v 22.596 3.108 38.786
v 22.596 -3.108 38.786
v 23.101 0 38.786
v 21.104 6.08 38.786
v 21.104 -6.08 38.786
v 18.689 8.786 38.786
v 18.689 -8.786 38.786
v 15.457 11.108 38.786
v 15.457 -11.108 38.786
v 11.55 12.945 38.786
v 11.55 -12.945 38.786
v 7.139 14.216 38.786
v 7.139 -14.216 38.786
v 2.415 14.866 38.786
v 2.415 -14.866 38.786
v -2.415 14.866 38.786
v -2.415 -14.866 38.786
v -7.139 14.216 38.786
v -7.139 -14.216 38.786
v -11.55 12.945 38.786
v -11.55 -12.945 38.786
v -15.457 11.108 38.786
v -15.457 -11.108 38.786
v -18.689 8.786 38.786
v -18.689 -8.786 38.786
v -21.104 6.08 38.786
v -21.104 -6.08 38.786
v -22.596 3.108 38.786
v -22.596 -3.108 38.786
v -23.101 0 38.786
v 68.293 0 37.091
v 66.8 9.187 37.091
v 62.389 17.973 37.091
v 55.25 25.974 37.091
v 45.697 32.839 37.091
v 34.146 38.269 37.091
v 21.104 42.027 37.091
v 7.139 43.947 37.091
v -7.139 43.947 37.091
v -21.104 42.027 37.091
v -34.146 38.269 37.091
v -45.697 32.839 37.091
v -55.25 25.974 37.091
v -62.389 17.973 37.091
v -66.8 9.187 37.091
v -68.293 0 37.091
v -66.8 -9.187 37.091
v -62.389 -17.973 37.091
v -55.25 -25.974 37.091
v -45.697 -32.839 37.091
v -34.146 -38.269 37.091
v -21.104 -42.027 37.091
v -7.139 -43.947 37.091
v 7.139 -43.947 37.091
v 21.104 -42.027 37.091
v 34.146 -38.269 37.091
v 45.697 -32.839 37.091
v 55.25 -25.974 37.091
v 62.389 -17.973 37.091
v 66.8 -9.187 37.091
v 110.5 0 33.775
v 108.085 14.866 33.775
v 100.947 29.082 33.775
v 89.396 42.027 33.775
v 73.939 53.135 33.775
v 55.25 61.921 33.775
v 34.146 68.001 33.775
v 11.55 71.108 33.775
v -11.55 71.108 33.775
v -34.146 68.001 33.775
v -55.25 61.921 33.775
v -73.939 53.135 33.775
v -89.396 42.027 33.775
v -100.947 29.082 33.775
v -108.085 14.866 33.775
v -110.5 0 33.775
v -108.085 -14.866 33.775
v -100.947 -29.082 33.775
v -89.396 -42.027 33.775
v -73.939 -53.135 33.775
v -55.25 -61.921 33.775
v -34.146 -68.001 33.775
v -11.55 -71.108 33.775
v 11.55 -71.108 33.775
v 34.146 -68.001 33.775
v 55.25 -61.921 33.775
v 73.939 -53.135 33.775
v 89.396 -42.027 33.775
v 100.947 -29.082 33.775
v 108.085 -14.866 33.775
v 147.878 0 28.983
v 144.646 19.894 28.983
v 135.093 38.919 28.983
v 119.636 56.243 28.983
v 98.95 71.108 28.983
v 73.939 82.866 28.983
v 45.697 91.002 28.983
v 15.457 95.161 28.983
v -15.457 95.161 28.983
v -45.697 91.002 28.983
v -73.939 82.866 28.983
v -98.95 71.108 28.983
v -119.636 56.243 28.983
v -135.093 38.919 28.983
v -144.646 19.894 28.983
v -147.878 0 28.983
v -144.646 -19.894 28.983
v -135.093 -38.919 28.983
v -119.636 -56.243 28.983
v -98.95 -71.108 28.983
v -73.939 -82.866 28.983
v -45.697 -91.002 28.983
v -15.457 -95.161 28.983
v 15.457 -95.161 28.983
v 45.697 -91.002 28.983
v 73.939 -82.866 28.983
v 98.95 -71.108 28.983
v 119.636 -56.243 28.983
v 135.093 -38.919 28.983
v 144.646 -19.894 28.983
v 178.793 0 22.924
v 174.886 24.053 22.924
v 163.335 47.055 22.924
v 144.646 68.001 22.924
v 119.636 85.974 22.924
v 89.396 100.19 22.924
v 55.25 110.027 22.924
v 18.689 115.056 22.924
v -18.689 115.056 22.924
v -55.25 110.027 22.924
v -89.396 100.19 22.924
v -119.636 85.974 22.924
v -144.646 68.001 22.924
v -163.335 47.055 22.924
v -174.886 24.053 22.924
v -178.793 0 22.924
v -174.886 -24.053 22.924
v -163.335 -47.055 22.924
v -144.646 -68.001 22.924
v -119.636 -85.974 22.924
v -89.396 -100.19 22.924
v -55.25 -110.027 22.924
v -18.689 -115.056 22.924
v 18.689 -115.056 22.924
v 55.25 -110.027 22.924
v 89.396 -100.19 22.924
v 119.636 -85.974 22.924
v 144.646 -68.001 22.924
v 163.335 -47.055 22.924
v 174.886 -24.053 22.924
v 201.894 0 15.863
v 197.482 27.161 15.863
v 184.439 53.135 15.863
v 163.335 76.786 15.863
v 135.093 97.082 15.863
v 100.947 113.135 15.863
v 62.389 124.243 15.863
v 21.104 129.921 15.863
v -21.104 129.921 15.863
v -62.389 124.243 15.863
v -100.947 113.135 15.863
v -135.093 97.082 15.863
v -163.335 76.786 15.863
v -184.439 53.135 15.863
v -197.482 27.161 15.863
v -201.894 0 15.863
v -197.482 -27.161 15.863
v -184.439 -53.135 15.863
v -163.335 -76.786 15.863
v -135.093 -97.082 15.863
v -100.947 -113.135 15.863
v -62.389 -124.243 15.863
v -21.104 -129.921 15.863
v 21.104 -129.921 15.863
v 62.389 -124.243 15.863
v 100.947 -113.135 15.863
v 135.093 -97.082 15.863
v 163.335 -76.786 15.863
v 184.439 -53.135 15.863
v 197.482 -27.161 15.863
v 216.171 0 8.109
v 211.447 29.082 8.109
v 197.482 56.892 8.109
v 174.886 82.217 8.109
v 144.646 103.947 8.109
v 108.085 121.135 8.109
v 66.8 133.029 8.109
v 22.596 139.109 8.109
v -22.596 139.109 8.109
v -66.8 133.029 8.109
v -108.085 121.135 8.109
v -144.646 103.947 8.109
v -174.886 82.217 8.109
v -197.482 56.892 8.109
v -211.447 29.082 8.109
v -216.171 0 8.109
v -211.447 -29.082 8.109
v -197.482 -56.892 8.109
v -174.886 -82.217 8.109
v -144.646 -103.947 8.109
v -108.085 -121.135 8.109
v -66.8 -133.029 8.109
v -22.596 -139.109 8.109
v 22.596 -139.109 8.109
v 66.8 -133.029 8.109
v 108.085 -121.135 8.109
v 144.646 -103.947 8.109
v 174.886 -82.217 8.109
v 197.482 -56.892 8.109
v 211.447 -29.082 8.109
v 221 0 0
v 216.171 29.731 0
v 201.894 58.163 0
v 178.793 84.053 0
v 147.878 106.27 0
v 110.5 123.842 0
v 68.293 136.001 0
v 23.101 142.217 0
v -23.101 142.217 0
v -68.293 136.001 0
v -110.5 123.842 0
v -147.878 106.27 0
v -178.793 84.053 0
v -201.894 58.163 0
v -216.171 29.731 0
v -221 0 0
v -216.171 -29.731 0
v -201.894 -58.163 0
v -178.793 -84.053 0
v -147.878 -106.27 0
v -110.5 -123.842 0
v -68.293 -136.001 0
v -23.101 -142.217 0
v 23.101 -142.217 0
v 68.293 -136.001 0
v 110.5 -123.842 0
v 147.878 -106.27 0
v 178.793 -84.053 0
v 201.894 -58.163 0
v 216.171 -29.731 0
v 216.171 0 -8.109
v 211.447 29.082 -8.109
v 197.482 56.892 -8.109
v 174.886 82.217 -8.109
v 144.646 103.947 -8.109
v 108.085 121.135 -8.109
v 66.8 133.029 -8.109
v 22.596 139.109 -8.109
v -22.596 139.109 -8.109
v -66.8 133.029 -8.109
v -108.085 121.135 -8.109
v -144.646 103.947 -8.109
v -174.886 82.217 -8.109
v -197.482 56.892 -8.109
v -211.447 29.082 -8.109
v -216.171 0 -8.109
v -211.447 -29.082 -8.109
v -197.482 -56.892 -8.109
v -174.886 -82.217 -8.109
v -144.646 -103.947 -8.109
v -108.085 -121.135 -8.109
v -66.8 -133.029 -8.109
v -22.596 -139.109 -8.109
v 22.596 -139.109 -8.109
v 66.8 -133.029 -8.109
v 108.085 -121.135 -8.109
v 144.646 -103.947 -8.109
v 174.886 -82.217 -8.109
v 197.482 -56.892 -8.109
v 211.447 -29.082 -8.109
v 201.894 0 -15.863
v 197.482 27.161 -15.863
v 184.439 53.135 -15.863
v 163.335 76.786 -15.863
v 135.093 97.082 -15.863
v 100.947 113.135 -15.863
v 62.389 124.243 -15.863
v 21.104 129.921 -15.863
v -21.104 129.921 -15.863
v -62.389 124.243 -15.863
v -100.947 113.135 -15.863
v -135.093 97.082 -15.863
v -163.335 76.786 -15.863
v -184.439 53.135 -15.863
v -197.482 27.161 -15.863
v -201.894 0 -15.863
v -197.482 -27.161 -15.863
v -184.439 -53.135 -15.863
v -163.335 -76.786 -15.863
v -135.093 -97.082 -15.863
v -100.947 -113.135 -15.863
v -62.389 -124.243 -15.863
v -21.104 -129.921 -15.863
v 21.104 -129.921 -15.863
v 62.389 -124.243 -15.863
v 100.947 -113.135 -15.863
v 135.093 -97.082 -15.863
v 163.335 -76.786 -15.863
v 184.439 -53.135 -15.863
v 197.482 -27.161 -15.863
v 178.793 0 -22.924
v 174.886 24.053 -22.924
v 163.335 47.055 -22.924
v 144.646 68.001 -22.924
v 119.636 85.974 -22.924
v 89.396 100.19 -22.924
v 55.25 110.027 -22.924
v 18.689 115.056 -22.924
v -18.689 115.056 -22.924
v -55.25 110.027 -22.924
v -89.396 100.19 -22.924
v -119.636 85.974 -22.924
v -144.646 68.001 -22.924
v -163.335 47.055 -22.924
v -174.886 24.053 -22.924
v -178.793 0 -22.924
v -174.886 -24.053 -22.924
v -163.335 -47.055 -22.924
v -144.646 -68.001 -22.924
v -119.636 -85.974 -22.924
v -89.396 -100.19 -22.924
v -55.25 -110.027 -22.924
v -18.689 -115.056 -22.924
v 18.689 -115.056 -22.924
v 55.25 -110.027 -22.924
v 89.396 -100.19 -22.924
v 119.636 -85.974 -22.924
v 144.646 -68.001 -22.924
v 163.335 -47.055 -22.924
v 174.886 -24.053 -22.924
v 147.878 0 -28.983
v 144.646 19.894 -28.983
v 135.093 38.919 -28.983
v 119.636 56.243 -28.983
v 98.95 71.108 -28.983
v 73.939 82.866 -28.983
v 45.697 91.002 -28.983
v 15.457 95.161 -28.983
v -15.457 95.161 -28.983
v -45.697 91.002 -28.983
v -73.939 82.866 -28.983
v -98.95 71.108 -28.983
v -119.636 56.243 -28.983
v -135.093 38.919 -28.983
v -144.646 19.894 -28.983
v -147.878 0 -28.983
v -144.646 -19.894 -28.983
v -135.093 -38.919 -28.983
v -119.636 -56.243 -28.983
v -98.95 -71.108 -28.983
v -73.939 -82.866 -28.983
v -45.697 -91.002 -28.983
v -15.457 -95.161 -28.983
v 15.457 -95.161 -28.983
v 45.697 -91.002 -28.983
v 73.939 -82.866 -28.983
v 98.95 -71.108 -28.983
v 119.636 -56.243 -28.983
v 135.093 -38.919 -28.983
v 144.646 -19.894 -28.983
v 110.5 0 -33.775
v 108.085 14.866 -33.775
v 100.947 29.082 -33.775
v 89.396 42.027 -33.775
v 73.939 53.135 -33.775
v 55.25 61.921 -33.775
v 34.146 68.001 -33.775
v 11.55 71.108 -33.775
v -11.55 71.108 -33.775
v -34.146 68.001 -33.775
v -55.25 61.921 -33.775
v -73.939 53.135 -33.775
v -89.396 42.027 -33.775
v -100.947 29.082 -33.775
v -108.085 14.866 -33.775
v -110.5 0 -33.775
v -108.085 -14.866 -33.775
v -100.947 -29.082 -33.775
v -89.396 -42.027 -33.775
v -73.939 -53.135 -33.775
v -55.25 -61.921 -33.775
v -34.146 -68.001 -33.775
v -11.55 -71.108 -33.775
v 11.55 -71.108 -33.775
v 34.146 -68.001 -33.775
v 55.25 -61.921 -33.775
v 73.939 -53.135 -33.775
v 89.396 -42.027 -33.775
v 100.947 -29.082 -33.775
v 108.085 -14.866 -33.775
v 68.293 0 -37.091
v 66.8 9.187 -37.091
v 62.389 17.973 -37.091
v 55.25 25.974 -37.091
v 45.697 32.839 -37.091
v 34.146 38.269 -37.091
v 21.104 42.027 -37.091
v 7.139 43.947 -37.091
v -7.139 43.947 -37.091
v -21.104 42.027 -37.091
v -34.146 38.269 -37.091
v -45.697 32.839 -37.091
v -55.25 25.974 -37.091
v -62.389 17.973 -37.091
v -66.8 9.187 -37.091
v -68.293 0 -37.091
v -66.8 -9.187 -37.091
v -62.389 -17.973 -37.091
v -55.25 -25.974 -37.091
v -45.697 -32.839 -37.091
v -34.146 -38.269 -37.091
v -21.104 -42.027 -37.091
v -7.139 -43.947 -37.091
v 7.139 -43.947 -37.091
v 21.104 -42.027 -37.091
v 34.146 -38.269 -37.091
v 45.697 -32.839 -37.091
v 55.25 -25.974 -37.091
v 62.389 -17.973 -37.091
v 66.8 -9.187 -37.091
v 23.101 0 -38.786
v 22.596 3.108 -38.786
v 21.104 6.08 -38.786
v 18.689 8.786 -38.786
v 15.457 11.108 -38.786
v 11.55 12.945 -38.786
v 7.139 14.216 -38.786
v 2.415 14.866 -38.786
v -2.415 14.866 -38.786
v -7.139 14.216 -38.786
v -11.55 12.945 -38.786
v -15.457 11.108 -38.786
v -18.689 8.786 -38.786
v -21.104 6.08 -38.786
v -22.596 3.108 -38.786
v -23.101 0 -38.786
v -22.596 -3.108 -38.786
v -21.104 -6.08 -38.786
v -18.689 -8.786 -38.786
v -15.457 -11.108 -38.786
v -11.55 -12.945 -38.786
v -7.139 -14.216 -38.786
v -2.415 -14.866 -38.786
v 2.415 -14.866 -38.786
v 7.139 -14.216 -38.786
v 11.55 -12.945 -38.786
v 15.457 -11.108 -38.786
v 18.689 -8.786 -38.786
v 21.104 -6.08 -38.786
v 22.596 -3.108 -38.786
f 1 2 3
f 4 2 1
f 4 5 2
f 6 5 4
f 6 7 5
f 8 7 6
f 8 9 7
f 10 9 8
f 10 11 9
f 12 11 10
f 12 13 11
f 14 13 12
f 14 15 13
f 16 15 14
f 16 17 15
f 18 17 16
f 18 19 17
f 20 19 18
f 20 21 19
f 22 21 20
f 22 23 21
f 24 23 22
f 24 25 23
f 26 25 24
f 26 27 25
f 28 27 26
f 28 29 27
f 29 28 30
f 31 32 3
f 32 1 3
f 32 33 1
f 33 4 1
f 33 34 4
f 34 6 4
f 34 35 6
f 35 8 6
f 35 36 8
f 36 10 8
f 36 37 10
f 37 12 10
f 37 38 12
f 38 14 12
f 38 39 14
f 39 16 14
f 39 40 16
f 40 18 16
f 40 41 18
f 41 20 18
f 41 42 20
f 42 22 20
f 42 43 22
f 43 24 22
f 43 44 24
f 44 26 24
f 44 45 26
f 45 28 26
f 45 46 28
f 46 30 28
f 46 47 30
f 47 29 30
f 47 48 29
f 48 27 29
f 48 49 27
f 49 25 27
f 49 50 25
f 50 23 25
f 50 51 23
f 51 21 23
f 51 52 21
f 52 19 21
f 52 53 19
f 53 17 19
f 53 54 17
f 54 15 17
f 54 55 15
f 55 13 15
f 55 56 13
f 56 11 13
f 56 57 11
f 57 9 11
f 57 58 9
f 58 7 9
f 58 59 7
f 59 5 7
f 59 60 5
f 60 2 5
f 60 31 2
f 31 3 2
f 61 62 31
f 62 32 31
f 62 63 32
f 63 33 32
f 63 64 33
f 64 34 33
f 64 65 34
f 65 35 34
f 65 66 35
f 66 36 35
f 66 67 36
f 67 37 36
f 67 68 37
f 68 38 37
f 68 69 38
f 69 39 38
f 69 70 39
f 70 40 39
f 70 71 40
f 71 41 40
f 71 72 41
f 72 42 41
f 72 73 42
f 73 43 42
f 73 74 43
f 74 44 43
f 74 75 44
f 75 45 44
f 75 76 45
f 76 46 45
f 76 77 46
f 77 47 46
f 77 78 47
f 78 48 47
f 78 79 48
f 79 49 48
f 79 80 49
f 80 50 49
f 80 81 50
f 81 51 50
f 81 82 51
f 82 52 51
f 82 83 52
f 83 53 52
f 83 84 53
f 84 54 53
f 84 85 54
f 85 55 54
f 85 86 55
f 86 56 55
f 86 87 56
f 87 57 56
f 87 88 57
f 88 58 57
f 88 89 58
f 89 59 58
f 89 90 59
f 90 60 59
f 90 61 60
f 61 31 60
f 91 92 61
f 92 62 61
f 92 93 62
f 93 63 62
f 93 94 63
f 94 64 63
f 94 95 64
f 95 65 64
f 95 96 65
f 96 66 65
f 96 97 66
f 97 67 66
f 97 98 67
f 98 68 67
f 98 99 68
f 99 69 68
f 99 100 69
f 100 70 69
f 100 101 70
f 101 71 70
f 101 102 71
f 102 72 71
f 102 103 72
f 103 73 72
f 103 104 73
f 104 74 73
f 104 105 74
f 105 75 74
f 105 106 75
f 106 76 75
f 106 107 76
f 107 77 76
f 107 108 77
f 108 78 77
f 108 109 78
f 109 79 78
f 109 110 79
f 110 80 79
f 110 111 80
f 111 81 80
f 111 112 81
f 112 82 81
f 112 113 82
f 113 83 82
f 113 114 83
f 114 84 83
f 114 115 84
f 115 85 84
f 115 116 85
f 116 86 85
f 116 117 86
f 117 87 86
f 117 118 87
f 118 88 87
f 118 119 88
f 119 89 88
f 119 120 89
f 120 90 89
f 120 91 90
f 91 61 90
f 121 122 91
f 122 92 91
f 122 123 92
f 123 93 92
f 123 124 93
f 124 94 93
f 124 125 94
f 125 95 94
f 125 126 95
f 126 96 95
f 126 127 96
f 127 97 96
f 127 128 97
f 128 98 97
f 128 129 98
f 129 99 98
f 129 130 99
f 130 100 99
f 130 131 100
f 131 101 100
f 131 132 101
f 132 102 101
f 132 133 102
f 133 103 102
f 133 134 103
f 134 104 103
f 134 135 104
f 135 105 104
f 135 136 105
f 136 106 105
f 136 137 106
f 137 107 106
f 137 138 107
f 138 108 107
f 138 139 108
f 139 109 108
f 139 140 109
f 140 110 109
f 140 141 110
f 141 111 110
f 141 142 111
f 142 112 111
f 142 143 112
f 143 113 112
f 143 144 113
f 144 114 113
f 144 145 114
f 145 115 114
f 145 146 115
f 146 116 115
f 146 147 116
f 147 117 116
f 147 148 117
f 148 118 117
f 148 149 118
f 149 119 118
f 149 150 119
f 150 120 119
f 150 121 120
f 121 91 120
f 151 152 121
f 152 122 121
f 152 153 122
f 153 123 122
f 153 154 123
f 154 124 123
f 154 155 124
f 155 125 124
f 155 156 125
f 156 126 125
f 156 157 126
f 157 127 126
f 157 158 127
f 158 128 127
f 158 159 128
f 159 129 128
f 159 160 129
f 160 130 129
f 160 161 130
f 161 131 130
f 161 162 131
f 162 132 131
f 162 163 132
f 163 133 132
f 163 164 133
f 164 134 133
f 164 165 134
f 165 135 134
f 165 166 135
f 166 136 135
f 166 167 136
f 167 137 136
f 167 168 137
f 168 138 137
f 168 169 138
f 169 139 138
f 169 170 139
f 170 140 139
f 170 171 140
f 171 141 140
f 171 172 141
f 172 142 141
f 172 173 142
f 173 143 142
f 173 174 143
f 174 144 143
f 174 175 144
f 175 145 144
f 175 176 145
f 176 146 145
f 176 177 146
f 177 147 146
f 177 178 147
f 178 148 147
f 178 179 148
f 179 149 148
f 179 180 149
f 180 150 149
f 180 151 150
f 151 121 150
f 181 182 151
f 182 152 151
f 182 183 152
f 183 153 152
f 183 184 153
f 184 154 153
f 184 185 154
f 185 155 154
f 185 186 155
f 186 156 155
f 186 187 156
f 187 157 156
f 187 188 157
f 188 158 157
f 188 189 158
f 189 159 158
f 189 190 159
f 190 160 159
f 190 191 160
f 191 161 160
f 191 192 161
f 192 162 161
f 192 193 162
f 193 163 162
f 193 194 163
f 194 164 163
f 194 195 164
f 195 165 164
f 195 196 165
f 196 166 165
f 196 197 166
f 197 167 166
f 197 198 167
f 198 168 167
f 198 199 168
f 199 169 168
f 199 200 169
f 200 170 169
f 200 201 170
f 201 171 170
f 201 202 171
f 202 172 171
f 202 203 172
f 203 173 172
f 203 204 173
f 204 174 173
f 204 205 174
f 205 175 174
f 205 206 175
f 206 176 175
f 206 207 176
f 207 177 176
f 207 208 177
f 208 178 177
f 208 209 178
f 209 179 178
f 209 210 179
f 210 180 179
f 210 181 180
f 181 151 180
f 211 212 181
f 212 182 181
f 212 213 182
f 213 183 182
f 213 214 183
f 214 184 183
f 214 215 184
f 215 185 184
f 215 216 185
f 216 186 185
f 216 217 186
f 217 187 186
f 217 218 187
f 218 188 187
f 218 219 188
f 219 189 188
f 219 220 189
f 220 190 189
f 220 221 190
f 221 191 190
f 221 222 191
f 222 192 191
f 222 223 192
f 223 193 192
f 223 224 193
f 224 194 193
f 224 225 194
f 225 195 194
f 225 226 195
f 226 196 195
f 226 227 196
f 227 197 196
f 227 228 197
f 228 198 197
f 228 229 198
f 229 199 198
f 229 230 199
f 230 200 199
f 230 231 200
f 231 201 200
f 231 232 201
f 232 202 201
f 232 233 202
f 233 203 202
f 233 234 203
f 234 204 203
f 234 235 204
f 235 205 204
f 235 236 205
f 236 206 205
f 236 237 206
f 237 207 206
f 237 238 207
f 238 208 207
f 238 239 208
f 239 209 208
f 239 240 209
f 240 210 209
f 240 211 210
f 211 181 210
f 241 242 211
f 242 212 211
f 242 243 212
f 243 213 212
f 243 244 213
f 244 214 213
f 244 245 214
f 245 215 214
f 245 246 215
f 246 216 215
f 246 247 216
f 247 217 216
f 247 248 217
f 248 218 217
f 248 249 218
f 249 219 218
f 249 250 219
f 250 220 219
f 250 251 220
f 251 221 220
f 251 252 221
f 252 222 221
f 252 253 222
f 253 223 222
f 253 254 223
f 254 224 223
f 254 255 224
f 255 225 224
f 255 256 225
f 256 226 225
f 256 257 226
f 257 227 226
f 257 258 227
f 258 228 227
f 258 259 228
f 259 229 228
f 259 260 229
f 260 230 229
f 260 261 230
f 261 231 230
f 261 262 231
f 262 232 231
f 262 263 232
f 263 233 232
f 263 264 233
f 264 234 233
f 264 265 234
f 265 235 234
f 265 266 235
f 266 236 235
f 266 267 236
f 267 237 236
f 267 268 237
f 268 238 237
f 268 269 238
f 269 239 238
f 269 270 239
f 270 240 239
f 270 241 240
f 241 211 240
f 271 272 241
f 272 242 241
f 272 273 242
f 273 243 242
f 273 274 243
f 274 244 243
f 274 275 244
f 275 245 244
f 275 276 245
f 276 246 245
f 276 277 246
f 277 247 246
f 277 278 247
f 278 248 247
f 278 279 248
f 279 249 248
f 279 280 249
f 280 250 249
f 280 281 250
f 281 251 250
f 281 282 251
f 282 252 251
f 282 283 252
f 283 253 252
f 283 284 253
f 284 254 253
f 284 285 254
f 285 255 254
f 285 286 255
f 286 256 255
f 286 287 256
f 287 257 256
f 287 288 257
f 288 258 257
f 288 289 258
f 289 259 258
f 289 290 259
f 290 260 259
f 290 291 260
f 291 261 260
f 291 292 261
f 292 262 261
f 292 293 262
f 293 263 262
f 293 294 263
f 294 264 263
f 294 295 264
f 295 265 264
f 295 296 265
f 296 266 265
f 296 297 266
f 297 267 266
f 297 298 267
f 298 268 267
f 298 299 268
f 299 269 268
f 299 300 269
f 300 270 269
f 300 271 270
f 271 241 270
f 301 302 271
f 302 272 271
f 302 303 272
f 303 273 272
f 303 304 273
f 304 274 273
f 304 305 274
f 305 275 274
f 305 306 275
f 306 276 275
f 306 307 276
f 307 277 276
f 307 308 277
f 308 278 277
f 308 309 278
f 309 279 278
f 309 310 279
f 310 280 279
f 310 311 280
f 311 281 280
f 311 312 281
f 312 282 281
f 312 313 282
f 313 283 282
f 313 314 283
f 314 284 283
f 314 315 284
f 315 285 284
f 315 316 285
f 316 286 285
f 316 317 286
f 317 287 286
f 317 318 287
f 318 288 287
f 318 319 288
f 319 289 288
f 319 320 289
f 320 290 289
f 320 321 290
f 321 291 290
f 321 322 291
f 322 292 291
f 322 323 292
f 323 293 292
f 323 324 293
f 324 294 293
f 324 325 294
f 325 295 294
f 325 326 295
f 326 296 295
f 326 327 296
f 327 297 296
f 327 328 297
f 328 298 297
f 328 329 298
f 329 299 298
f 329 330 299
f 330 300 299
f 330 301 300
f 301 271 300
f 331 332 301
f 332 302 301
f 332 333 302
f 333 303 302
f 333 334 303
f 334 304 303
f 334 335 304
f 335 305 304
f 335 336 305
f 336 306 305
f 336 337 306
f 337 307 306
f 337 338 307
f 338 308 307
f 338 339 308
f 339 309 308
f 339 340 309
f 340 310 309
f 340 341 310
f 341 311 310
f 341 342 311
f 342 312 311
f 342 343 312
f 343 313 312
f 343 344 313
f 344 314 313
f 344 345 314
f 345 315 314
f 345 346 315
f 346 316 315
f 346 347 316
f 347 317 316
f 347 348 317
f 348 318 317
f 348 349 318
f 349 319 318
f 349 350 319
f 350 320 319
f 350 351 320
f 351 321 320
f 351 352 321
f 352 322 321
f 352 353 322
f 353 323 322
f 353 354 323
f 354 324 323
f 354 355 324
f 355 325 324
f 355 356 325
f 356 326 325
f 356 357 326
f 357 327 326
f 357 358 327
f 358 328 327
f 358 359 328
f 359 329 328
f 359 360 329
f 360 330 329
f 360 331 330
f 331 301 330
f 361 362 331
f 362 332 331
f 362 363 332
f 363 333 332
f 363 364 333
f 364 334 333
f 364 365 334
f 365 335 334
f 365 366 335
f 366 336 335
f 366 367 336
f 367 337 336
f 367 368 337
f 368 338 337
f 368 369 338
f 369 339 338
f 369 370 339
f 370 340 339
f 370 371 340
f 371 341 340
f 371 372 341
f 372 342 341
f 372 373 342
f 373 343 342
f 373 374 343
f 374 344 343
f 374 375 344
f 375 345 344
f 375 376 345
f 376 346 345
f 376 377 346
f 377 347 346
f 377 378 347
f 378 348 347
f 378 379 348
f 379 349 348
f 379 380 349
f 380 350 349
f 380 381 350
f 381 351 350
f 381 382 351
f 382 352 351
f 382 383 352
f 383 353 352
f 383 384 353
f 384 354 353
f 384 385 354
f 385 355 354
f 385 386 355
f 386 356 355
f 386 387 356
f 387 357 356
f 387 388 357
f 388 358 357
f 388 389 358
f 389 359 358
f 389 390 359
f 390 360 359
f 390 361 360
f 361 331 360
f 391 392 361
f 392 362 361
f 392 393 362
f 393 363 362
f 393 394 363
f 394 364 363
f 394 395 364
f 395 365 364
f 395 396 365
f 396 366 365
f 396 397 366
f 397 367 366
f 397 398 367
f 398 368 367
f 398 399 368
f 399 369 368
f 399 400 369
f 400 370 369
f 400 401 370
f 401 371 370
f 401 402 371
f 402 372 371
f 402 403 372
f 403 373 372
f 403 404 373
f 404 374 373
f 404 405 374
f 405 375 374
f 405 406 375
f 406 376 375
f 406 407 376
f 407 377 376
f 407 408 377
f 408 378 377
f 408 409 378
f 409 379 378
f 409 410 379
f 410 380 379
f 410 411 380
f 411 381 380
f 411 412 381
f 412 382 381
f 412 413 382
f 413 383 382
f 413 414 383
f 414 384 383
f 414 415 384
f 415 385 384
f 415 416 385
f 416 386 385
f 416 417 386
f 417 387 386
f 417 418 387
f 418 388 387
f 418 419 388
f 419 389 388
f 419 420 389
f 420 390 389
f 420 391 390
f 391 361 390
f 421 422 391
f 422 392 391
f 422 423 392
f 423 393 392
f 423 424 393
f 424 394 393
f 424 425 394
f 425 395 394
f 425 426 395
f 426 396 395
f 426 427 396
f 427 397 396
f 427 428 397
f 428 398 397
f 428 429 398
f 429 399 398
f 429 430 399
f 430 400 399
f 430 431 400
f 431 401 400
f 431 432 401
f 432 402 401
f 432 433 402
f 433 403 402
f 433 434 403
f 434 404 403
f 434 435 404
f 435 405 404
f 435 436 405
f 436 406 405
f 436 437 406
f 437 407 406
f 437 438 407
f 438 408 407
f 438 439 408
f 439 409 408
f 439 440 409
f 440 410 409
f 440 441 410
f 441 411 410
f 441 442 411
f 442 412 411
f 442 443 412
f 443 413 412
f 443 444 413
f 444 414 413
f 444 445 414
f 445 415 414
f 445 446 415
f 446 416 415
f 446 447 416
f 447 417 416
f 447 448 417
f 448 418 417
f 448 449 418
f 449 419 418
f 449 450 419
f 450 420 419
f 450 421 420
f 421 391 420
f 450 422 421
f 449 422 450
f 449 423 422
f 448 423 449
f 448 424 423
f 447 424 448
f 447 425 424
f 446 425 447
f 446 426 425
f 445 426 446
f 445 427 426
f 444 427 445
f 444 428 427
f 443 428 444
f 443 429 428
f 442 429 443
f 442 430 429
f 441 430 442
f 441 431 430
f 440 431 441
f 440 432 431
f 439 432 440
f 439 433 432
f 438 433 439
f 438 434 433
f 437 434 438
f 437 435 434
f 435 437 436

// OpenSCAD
// Generated by SolidPython 1.0.1 on 2020-07-29 00:46:53


scale(v = [17, 11, 3]) {
	sphere(r = 13);
}
/***********************************************
*********      SolidPython code:      **********
************************************************
 
# import packages: SolidPython
from solid import *
from solid.utils import *
from itertools import chain, combinations, permutations


class Resize:

    def __init__(self, scad_file):
        self.scad_file = scad_file
        #self.scad_file = import_scad(scad_file)
        # cone/cylinder param:
        self.r1 = 0
        self.r2 = 0
        self.h = 0
        # rectangular prism param:
        self.w = 0
        self.l = 0
        # ellipse param:
        self.r = 0

    # import OpenScad code (file name corresponds to shape)


    # classify shape + parameters
    def assign(self, param1, param2, param3):
        if self.scad_file == 'cone.scad':
            self.r1 = param1
            self.r2 = param2
            self.h = param3
        elif self.scad_file == 'cylinder.scad':
            self.r1 = param1
            self.r2 = param2
            self.h = param3
        elif self.scad_file == 'rectangularPrism.scad':
            self.h = param1
            self.l = param2
            self.w = param3
        else:
            self.r = param1
            self.h = param2

    # resize parameters
    def iterate(self):
        x = range(3, 20, 2)
        i = 1
        if self.scad_file == 'cone.scad':
            tempList = list(permutations(x, 2))
            for temp in tempList:
                param1 = temp[0]
                param2 = temp[1]
                filepath = 'produced_scad_files/' + 'cone' + str(param1) + '_' + str(param2) + '_' + '.scad'
                scad_render_to_file(cylinder(h=param1, r1=param2, r2=0), filepath)

        elif self.scad_file == 'cylinder.scad':
            tempList = list(permutations(x, 3))
            for temp in tempList:
                param1 = temp[0]
                param2 = temp[1]
                filepath = 'produced_scad_files/' + 'cylinder' + str(param1) + '_' + str(param2) + '_' + '.scad'
                scad_render_to_file(cylinder(h=param1, r1=param2, r2=param2), filepath)

        elif self.scad_file == 'rectangularPrism.scad':
            tempList = list(permutations(x, 3))
            for temp in tempList:
                param1 = temp[0]
                param2 = temp[1]
                param3 = temp[2]
                filepath = 'produced_scad_files/' + 'rectangularPrism' + str(param1) + '_' + str(param2) + '_' + str(
                    param3) + '.scad'
                scad_render_to_file(cube(size=(param1, param2, param3)), filepath)

        elif self.scad_file == 'ellipse.scad':
            tempList = list(permutations(x, 4))
            for temp in tempList:
                param1 = temp[0]
                param2 = temp[1]
                param3 = temp[2]
                param4 = temp[3]
                filepath = 'produced_scad_files/' + 'ellipse' + str(param1) + '_' + str(param2) + '_' + str(param3) + '_' + str(param4) + '.scad'
                scad_render_to_file(scale([param1, param2, param3])(sphere(r=param4)), filepath)

    def render_to_scadfile(self):
        scad_render_to_file(scad, 'example.scad') 
 
************************************************/
